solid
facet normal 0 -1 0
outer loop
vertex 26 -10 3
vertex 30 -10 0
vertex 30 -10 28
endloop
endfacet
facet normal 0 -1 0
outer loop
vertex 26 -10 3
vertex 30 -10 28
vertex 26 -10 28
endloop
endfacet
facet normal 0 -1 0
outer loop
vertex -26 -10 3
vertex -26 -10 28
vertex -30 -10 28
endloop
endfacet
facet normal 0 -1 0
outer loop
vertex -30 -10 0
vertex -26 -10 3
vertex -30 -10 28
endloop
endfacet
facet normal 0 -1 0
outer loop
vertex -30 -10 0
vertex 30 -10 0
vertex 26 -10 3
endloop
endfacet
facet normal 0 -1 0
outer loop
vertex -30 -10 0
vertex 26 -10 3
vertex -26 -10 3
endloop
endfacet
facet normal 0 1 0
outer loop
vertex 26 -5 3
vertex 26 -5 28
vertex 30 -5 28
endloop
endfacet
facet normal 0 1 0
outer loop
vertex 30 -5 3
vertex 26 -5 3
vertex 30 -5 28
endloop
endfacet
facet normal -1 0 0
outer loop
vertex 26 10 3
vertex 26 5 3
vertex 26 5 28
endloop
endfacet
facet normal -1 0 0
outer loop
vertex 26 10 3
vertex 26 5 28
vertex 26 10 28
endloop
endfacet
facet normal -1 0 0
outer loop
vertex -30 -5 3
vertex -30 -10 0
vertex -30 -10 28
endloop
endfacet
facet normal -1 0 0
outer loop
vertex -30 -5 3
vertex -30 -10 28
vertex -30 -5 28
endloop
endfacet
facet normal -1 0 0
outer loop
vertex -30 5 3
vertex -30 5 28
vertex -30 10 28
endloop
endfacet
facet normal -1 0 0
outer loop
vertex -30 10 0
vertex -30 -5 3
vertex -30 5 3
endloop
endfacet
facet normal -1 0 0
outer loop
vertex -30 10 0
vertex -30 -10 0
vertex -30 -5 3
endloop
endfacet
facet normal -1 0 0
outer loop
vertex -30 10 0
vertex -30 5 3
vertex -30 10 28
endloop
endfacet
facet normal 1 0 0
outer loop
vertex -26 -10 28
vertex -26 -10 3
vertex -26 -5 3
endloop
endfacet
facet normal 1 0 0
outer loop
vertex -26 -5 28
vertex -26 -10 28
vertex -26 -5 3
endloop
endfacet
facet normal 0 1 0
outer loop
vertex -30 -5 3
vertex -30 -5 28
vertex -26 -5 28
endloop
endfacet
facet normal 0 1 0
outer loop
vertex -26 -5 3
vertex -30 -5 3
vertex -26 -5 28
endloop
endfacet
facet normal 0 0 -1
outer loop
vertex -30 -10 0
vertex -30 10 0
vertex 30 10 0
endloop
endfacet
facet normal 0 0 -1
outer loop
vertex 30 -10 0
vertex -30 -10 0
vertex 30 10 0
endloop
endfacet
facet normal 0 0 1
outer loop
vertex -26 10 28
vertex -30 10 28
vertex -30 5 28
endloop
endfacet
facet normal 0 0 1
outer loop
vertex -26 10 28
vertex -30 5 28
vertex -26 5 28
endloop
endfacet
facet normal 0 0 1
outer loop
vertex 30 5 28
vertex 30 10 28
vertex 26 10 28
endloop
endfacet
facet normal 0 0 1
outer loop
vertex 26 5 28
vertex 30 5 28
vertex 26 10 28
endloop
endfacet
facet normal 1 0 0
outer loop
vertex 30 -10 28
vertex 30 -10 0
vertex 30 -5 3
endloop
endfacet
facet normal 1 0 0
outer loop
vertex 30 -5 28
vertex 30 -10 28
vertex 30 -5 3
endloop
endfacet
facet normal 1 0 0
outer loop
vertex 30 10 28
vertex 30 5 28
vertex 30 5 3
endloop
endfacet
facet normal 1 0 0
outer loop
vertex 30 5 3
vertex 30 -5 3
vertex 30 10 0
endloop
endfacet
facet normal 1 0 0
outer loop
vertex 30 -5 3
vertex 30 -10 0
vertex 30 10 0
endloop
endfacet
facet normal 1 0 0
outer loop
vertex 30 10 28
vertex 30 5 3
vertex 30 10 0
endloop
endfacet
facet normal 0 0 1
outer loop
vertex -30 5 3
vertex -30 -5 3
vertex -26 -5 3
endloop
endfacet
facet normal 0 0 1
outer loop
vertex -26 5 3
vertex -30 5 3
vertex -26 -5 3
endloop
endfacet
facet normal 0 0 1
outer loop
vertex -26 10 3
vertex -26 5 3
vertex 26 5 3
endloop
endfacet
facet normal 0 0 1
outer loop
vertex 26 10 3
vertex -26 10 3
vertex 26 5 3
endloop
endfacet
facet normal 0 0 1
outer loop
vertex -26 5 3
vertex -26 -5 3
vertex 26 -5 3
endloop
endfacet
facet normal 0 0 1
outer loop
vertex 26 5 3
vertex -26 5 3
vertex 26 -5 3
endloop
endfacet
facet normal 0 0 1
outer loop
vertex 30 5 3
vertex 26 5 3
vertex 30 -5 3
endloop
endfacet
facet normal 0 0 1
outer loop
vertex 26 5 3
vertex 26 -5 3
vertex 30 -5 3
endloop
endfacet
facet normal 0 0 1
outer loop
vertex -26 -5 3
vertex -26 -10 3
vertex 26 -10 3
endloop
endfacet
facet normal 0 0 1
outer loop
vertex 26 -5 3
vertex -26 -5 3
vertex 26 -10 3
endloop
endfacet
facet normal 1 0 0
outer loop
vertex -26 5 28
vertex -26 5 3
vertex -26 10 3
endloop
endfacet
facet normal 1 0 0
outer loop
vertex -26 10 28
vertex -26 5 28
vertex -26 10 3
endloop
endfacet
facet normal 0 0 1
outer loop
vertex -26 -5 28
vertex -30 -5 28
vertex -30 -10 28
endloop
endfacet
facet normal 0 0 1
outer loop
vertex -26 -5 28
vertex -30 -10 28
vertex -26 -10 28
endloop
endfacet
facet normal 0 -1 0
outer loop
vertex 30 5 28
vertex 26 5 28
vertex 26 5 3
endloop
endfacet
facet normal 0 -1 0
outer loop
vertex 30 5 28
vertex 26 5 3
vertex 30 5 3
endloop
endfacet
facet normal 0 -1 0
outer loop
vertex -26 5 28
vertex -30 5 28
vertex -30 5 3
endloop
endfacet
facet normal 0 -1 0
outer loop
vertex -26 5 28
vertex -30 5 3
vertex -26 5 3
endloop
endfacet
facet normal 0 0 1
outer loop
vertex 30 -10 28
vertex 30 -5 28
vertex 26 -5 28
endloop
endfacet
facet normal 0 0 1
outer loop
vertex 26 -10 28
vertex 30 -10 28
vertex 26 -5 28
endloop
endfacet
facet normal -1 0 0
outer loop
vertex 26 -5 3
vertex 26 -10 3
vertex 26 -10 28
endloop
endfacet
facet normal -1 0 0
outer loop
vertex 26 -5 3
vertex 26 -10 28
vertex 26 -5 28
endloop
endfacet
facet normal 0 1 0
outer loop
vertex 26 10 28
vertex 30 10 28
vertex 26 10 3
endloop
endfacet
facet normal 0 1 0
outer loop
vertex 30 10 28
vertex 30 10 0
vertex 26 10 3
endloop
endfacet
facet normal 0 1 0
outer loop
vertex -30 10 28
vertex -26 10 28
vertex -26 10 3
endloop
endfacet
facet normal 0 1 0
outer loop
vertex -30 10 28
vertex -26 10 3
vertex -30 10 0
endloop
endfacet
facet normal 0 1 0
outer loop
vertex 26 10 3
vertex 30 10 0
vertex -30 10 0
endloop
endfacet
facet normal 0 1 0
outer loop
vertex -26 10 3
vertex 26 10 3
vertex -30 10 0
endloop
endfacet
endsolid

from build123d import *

# Parameters (mm, degrees)
F0_W     = 60
F0_H     = 20
F1_DEPTH = 3
F2_W     = 4
F2_H     = 20
F3_DEPTH = 25
F4_W     = 60
F4_H     = 25
F5_DEPTH = 5


# Not quite as in the source:
# - a pattern or mirror of a feature is missing from the dataset's text; its kind, count and spacing are read off the source's solid


with BuildPart() as f1:
    # F0 (on Top) → F1 (new body)
    with BuildSketch(Plane.XY):
        Rectangle(F0_W, F0_H)
    extrude(amount=F1_DEPTH)

    # F2 (on face) → F3 (join)
    with BuildSketch(Plane.XY.offset(3)):
        with Locations((-28, 0)):
            Rectangle(F2_W, F2_H)
    f3 = extrude(amount=F3_DEPTH)

    # F3_copies: F3 across plane
    add(f3.mirror(Plane(origin=(0, 0, 0), x_dir=(0, 0, 1), z_dir=(1, 0, 0))))

    # F4 (on Front) → F5 (cut, symmetric)
    with BuildSketch(Plane.XZ):
        with Locations((0, 15.5)):
            Rectangle(F4_W, F4_H)
    extrude(amount=F5_DEPTH, both=True, mode=Mode.SUBTRACT)


solid = f1.part
